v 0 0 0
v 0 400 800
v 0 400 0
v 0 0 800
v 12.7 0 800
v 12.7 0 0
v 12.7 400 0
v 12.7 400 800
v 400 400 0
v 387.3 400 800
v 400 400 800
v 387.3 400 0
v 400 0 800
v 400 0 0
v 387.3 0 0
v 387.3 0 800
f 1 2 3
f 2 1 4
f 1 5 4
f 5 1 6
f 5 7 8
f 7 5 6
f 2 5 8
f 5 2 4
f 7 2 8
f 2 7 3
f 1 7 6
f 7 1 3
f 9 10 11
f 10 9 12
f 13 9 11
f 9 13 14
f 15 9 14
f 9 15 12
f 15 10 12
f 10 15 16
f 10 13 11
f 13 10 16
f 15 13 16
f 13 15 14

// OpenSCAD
total_width=400;
total_height=800;
total_depth=400;

in=25.4;
wood=in/2;

module dirror_x(x=0) {
    children();
    translate([x,0])
    mirror([1,0])
    children();
}

module wood(height=wood) {
    linear_extrude(height=height)
    children();
}

module side() {
    square([total_width,total_height]);
}


dirror_x(total_width)
rotate([90,0,90])
wood()
side();
